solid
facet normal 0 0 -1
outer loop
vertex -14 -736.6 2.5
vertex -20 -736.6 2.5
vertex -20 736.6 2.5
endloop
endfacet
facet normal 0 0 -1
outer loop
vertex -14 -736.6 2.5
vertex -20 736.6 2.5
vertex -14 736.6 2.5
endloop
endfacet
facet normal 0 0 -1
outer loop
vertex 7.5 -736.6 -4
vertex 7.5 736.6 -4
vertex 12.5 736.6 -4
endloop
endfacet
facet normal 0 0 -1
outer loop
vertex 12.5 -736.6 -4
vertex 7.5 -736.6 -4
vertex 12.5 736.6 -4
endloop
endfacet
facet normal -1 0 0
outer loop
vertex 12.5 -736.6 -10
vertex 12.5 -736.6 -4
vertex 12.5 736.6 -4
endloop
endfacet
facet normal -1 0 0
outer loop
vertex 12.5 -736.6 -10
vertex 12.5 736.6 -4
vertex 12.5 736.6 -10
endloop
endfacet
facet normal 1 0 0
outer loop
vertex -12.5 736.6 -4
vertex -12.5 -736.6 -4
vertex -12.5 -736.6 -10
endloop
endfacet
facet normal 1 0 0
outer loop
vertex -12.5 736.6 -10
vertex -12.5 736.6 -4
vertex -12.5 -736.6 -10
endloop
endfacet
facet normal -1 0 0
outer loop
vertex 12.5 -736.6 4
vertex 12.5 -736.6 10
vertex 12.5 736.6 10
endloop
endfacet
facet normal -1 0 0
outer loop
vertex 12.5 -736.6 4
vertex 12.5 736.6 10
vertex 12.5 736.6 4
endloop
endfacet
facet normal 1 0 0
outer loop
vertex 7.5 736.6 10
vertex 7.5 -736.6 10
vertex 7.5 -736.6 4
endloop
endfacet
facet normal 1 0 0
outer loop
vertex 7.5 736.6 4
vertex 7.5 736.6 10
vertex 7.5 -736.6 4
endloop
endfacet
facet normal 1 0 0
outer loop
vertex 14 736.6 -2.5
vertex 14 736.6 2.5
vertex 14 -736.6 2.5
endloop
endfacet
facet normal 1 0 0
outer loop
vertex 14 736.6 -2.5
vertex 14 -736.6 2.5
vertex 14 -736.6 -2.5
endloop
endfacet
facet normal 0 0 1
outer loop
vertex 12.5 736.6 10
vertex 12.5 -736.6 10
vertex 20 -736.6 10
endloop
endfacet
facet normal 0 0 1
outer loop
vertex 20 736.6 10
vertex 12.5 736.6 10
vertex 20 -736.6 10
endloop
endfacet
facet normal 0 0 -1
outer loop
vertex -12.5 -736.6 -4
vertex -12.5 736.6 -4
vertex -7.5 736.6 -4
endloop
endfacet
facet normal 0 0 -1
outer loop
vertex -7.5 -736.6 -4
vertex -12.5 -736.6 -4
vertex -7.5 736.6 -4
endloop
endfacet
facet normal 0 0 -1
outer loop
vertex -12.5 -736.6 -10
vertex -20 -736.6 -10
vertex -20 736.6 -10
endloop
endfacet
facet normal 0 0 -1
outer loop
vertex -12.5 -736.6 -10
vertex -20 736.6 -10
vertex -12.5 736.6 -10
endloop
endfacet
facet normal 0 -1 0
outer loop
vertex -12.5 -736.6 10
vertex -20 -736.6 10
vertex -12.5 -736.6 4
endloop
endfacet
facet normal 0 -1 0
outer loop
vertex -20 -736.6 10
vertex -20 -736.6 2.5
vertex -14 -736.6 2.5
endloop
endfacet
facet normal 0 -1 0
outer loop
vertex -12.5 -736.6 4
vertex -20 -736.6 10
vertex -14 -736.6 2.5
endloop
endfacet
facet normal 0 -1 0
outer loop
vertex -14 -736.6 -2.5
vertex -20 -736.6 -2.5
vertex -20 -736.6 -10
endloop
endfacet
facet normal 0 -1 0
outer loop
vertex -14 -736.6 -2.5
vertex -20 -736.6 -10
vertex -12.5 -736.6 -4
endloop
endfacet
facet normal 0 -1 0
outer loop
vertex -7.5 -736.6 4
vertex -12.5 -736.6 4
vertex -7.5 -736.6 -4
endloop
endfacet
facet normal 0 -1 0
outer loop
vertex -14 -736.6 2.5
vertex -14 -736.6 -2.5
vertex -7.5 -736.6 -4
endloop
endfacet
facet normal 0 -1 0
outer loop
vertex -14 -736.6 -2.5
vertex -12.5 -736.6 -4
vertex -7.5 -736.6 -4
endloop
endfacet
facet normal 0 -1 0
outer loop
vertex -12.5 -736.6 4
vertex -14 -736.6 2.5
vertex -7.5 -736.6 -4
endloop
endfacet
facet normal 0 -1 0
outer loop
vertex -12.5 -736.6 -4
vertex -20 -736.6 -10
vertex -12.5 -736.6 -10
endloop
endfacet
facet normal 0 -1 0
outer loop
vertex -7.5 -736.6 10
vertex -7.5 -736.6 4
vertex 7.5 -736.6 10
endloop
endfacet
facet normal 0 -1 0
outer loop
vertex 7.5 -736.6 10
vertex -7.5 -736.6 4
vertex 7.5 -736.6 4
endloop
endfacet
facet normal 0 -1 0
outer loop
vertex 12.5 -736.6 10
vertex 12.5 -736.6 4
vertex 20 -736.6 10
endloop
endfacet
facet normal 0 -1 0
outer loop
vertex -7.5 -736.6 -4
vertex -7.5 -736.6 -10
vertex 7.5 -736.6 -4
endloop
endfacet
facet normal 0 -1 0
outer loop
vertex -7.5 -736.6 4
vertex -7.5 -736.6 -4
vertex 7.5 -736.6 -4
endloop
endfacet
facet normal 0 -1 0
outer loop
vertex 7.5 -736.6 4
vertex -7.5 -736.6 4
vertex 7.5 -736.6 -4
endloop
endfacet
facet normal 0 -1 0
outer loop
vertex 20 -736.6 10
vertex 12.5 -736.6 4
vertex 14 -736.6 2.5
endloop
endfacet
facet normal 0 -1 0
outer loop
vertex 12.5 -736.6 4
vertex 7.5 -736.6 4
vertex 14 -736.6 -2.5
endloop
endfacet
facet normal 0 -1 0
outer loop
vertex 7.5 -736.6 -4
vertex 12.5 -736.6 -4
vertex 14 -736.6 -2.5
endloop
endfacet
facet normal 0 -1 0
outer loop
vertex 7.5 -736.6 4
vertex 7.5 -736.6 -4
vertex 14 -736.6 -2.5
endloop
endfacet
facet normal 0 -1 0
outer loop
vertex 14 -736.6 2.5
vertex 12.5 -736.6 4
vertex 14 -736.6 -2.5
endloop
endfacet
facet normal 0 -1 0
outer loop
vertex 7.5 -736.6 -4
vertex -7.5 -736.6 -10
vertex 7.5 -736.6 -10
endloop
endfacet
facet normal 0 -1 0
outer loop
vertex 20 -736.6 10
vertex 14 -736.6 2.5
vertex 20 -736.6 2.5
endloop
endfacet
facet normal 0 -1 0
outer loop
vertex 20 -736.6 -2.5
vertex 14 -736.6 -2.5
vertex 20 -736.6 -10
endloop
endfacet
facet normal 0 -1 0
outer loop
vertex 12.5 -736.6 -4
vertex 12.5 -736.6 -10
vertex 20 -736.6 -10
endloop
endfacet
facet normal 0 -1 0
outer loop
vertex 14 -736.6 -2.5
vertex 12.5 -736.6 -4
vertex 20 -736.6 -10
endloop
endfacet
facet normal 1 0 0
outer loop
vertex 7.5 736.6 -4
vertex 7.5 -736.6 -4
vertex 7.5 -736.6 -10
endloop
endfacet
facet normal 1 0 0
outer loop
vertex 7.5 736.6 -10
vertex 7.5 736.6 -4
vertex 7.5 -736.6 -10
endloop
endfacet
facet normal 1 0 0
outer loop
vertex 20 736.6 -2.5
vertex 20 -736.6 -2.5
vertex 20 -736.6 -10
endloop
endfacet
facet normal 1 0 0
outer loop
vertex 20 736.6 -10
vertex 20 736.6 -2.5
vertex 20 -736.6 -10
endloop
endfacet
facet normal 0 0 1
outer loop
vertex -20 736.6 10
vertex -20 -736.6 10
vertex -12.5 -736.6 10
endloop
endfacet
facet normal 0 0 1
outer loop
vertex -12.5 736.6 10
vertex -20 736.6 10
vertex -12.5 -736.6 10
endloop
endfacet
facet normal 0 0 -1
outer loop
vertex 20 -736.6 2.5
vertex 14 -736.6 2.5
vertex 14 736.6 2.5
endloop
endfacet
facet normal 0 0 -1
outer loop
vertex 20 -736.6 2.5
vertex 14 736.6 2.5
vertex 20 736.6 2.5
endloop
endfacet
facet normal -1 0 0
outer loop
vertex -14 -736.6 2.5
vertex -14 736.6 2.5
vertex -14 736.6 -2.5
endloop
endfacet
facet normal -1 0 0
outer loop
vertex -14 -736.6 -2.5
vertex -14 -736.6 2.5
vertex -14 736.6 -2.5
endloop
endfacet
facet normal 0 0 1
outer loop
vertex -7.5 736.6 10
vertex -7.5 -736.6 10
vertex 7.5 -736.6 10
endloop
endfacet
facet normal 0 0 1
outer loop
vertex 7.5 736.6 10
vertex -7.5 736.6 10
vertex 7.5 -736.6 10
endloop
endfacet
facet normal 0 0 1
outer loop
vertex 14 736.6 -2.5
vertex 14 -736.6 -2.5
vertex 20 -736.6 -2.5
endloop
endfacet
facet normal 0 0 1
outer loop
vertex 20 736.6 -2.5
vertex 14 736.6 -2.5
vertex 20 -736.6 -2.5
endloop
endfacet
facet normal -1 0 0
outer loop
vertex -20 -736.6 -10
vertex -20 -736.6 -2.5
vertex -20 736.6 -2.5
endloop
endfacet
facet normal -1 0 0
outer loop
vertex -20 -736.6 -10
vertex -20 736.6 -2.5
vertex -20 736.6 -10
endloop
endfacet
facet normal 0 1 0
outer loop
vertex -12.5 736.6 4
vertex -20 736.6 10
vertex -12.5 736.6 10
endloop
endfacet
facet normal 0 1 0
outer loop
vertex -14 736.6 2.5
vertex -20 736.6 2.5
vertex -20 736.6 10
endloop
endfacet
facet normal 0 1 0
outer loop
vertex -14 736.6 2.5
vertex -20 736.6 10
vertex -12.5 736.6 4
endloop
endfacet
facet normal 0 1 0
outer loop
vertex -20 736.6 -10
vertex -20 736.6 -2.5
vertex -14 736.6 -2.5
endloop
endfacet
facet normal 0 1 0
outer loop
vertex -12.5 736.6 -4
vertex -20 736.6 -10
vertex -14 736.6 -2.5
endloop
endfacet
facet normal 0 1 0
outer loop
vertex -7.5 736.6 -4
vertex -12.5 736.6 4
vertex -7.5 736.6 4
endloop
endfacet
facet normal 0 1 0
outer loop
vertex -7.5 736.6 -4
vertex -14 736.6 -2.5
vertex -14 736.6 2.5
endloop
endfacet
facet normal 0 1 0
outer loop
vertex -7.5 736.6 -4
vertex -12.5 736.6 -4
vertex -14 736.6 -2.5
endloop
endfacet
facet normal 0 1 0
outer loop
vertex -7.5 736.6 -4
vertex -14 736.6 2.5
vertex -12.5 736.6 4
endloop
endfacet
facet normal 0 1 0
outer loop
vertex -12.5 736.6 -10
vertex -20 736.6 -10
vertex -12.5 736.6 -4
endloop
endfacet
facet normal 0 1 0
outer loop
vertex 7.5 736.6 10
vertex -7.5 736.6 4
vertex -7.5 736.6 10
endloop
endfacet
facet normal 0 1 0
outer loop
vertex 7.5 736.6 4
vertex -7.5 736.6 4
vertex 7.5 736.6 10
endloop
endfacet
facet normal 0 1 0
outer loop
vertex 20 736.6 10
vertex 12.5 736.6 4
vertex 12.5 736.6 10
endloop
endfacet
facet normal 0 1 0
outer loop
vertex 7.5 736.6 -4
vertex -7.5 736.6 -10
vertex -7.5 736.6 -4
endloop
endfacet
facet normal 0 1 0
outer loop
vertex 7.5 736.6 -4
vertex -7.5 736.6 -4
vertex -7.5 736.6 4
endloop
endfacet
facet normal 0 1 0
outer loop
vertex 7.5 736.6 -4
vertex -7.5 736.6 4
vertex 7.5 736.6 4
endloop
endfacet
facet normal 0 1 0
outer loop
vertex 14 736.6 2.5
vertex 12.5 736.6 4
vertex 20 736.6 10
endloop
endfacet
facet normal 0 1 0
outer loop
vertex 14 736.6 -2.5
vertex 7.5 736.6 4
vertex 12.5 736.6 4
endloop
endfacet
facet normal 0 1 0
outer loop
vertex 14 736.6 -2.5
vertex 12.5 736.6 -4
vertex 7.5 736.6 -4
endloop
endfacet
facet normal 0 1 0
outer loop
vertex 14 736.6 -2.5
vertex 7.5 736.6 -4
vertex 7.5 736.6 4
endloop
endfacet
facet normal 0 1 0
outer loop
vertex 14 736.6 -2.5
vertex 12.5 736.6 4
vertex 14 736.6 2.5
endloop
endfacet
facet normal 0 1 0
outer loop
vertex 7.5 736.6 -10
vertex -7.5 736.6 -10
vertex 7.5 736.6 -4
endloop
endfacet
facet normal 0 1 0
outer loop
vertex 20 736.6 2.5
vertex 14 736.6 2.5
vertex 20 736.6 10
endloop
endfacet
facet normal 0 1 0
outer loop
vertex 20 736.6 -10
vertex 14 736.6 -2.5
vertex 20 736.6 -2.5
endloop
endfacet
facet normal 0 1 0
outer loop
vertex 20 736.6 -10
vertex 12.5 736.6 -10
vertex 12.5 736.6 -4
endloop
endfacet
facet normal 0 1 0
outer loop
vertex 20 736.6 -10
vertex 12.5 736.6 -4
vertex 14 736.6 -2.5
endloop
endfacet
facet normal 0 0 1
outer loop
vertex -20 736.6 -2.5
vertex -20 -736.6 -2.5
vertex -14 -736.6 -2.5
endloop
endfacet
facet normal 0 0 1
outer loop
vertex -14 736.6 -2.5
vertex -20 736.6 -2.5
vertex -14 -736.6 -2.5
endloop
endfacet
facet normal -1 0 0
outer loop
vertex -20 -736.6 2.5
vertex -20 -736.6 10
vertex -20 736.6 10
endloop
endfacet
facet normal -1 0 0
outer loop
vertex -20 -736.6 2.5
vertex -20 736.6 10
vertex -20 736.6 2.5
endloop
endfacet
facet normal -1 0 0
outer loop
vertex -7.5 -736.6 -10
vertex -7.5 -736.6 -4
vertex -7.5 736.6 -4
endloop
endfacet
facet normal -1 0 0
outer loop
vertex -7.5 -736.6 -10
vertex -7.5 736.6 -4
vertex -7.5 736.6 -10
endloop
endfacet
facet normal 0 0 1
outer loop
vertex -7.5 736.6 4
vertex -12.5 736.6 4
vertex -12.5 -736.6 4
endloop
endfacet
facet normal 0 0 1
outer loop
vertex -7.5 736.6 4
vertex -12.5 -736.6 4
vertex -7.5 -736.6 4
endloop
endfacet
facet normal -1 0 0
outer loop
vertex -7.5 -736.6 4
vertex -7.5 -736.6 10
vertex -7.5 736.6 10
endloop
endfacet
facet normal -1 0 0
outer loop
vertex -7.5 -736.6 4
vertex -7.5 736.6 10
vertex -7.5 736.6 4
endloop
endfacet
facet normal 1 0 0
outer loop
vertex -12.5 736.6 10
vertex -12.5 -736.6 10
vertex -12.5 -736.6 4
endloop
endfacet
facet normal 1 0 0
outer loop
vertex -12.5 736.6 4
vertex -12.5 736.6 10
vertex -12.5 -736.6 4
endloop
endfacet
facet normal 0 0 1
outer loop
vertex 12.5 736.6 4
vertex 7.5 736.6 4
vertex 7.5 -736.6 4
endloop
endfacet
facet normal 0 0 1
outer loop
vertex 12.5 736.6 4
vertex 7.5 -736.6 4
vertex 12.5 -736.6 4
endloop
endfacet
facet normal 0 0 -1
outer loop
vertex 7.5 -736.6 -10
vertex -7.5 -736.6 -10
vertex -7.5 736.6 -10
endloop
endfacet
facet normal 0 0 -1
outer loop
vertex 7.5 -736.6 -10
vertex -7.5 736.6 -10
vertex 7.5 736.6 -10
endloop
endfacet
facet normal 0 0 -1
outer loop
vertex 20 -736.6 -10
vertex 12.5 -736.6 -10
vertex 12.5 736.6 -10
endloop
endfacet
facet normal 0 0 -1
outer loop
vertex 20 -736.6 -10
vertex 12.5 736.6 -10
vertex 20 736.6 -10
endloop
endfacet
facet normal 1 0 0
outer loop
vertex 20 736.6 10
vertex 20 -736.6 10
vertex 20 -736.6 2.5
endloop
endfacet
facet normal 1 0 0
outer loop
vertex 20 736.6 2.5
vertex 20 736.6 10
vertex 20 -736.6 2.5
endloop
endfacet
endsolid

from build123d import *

# Parameters (mm, degrees)
BOSS_EXTRUDE1_DEPTH      = 736.6
BOSS_EXTRUDE1_DEPTH_BACK = 736.6
SKETCH1_W                = 40
SKETCH1_H                = 20
CUT_EXTRUDE1_DEPTH       = 737.939319076
CUT_EXTRUDE1_DEPTH_BACK  = 737.939319076
SKETCH2_W                = 5
SKETCH2_H                = 12
SKETCH2_W_2              = 12
SKETCH2_H_2              = 5


with BuildPart() as part:
    # Sketch1 → Boss-Extrude1 (new, two sides: drawn at the far end of the back side and taken through both)
    with BuildSketch(Plane(origin=(0, 0, 0), x_dir=(1, 0, 0), z_dir=(0, 1, 0)).offset(-BOSS_EXTRUDE1_DEPTH_BACK)):
        Rectangle(SKETCH1_W, SKETCH1_H)
    extrude(amount=BOSS_EXTRUDE1_DEPTH + BOSS_EXTRUDE1_DEPTH_BACK)

    # Sketch2 → Cut-Extrude1 (cut, two sides: drawn at the far end of the back side and taken through both)
    with BuildSketch(Plane(origin=(0, 0, 0), x_dir=(1, 0, 0), z_dir=(0, 1, 0)).offset(-CUT_EXTRUDE1_DEPTH_BACK)):
        with Locations((-10, 10)):
            Rectangle(SKETCH2_W, SKETCH2_H)
        with Locations((-10, -10)):
            Rectangle(SKETCH2_W, SKETCH2_H)
        with Locations((-20, 0)):
            Rectangle(SKETCH2_W_2, SKETCH2_H_2)
        with Locations((10, 10)):
            Rectangle(SKETCH2_W, SKETCH2_H)
        with Locations((20, 0)):
            Rectangle(SKETCH2_W_2, SKETCH2_H_2)
        with Locations((10, -10)):
            Rectangle(SKETCH2_W, SKETCH2_H)
    extrude(amount=CUT_EXTRUDE1_DEPTH + CUT_EXTRUDE1_DEPTH_BACK, mode=Mode.SUBTRACT)


solid = part.part
